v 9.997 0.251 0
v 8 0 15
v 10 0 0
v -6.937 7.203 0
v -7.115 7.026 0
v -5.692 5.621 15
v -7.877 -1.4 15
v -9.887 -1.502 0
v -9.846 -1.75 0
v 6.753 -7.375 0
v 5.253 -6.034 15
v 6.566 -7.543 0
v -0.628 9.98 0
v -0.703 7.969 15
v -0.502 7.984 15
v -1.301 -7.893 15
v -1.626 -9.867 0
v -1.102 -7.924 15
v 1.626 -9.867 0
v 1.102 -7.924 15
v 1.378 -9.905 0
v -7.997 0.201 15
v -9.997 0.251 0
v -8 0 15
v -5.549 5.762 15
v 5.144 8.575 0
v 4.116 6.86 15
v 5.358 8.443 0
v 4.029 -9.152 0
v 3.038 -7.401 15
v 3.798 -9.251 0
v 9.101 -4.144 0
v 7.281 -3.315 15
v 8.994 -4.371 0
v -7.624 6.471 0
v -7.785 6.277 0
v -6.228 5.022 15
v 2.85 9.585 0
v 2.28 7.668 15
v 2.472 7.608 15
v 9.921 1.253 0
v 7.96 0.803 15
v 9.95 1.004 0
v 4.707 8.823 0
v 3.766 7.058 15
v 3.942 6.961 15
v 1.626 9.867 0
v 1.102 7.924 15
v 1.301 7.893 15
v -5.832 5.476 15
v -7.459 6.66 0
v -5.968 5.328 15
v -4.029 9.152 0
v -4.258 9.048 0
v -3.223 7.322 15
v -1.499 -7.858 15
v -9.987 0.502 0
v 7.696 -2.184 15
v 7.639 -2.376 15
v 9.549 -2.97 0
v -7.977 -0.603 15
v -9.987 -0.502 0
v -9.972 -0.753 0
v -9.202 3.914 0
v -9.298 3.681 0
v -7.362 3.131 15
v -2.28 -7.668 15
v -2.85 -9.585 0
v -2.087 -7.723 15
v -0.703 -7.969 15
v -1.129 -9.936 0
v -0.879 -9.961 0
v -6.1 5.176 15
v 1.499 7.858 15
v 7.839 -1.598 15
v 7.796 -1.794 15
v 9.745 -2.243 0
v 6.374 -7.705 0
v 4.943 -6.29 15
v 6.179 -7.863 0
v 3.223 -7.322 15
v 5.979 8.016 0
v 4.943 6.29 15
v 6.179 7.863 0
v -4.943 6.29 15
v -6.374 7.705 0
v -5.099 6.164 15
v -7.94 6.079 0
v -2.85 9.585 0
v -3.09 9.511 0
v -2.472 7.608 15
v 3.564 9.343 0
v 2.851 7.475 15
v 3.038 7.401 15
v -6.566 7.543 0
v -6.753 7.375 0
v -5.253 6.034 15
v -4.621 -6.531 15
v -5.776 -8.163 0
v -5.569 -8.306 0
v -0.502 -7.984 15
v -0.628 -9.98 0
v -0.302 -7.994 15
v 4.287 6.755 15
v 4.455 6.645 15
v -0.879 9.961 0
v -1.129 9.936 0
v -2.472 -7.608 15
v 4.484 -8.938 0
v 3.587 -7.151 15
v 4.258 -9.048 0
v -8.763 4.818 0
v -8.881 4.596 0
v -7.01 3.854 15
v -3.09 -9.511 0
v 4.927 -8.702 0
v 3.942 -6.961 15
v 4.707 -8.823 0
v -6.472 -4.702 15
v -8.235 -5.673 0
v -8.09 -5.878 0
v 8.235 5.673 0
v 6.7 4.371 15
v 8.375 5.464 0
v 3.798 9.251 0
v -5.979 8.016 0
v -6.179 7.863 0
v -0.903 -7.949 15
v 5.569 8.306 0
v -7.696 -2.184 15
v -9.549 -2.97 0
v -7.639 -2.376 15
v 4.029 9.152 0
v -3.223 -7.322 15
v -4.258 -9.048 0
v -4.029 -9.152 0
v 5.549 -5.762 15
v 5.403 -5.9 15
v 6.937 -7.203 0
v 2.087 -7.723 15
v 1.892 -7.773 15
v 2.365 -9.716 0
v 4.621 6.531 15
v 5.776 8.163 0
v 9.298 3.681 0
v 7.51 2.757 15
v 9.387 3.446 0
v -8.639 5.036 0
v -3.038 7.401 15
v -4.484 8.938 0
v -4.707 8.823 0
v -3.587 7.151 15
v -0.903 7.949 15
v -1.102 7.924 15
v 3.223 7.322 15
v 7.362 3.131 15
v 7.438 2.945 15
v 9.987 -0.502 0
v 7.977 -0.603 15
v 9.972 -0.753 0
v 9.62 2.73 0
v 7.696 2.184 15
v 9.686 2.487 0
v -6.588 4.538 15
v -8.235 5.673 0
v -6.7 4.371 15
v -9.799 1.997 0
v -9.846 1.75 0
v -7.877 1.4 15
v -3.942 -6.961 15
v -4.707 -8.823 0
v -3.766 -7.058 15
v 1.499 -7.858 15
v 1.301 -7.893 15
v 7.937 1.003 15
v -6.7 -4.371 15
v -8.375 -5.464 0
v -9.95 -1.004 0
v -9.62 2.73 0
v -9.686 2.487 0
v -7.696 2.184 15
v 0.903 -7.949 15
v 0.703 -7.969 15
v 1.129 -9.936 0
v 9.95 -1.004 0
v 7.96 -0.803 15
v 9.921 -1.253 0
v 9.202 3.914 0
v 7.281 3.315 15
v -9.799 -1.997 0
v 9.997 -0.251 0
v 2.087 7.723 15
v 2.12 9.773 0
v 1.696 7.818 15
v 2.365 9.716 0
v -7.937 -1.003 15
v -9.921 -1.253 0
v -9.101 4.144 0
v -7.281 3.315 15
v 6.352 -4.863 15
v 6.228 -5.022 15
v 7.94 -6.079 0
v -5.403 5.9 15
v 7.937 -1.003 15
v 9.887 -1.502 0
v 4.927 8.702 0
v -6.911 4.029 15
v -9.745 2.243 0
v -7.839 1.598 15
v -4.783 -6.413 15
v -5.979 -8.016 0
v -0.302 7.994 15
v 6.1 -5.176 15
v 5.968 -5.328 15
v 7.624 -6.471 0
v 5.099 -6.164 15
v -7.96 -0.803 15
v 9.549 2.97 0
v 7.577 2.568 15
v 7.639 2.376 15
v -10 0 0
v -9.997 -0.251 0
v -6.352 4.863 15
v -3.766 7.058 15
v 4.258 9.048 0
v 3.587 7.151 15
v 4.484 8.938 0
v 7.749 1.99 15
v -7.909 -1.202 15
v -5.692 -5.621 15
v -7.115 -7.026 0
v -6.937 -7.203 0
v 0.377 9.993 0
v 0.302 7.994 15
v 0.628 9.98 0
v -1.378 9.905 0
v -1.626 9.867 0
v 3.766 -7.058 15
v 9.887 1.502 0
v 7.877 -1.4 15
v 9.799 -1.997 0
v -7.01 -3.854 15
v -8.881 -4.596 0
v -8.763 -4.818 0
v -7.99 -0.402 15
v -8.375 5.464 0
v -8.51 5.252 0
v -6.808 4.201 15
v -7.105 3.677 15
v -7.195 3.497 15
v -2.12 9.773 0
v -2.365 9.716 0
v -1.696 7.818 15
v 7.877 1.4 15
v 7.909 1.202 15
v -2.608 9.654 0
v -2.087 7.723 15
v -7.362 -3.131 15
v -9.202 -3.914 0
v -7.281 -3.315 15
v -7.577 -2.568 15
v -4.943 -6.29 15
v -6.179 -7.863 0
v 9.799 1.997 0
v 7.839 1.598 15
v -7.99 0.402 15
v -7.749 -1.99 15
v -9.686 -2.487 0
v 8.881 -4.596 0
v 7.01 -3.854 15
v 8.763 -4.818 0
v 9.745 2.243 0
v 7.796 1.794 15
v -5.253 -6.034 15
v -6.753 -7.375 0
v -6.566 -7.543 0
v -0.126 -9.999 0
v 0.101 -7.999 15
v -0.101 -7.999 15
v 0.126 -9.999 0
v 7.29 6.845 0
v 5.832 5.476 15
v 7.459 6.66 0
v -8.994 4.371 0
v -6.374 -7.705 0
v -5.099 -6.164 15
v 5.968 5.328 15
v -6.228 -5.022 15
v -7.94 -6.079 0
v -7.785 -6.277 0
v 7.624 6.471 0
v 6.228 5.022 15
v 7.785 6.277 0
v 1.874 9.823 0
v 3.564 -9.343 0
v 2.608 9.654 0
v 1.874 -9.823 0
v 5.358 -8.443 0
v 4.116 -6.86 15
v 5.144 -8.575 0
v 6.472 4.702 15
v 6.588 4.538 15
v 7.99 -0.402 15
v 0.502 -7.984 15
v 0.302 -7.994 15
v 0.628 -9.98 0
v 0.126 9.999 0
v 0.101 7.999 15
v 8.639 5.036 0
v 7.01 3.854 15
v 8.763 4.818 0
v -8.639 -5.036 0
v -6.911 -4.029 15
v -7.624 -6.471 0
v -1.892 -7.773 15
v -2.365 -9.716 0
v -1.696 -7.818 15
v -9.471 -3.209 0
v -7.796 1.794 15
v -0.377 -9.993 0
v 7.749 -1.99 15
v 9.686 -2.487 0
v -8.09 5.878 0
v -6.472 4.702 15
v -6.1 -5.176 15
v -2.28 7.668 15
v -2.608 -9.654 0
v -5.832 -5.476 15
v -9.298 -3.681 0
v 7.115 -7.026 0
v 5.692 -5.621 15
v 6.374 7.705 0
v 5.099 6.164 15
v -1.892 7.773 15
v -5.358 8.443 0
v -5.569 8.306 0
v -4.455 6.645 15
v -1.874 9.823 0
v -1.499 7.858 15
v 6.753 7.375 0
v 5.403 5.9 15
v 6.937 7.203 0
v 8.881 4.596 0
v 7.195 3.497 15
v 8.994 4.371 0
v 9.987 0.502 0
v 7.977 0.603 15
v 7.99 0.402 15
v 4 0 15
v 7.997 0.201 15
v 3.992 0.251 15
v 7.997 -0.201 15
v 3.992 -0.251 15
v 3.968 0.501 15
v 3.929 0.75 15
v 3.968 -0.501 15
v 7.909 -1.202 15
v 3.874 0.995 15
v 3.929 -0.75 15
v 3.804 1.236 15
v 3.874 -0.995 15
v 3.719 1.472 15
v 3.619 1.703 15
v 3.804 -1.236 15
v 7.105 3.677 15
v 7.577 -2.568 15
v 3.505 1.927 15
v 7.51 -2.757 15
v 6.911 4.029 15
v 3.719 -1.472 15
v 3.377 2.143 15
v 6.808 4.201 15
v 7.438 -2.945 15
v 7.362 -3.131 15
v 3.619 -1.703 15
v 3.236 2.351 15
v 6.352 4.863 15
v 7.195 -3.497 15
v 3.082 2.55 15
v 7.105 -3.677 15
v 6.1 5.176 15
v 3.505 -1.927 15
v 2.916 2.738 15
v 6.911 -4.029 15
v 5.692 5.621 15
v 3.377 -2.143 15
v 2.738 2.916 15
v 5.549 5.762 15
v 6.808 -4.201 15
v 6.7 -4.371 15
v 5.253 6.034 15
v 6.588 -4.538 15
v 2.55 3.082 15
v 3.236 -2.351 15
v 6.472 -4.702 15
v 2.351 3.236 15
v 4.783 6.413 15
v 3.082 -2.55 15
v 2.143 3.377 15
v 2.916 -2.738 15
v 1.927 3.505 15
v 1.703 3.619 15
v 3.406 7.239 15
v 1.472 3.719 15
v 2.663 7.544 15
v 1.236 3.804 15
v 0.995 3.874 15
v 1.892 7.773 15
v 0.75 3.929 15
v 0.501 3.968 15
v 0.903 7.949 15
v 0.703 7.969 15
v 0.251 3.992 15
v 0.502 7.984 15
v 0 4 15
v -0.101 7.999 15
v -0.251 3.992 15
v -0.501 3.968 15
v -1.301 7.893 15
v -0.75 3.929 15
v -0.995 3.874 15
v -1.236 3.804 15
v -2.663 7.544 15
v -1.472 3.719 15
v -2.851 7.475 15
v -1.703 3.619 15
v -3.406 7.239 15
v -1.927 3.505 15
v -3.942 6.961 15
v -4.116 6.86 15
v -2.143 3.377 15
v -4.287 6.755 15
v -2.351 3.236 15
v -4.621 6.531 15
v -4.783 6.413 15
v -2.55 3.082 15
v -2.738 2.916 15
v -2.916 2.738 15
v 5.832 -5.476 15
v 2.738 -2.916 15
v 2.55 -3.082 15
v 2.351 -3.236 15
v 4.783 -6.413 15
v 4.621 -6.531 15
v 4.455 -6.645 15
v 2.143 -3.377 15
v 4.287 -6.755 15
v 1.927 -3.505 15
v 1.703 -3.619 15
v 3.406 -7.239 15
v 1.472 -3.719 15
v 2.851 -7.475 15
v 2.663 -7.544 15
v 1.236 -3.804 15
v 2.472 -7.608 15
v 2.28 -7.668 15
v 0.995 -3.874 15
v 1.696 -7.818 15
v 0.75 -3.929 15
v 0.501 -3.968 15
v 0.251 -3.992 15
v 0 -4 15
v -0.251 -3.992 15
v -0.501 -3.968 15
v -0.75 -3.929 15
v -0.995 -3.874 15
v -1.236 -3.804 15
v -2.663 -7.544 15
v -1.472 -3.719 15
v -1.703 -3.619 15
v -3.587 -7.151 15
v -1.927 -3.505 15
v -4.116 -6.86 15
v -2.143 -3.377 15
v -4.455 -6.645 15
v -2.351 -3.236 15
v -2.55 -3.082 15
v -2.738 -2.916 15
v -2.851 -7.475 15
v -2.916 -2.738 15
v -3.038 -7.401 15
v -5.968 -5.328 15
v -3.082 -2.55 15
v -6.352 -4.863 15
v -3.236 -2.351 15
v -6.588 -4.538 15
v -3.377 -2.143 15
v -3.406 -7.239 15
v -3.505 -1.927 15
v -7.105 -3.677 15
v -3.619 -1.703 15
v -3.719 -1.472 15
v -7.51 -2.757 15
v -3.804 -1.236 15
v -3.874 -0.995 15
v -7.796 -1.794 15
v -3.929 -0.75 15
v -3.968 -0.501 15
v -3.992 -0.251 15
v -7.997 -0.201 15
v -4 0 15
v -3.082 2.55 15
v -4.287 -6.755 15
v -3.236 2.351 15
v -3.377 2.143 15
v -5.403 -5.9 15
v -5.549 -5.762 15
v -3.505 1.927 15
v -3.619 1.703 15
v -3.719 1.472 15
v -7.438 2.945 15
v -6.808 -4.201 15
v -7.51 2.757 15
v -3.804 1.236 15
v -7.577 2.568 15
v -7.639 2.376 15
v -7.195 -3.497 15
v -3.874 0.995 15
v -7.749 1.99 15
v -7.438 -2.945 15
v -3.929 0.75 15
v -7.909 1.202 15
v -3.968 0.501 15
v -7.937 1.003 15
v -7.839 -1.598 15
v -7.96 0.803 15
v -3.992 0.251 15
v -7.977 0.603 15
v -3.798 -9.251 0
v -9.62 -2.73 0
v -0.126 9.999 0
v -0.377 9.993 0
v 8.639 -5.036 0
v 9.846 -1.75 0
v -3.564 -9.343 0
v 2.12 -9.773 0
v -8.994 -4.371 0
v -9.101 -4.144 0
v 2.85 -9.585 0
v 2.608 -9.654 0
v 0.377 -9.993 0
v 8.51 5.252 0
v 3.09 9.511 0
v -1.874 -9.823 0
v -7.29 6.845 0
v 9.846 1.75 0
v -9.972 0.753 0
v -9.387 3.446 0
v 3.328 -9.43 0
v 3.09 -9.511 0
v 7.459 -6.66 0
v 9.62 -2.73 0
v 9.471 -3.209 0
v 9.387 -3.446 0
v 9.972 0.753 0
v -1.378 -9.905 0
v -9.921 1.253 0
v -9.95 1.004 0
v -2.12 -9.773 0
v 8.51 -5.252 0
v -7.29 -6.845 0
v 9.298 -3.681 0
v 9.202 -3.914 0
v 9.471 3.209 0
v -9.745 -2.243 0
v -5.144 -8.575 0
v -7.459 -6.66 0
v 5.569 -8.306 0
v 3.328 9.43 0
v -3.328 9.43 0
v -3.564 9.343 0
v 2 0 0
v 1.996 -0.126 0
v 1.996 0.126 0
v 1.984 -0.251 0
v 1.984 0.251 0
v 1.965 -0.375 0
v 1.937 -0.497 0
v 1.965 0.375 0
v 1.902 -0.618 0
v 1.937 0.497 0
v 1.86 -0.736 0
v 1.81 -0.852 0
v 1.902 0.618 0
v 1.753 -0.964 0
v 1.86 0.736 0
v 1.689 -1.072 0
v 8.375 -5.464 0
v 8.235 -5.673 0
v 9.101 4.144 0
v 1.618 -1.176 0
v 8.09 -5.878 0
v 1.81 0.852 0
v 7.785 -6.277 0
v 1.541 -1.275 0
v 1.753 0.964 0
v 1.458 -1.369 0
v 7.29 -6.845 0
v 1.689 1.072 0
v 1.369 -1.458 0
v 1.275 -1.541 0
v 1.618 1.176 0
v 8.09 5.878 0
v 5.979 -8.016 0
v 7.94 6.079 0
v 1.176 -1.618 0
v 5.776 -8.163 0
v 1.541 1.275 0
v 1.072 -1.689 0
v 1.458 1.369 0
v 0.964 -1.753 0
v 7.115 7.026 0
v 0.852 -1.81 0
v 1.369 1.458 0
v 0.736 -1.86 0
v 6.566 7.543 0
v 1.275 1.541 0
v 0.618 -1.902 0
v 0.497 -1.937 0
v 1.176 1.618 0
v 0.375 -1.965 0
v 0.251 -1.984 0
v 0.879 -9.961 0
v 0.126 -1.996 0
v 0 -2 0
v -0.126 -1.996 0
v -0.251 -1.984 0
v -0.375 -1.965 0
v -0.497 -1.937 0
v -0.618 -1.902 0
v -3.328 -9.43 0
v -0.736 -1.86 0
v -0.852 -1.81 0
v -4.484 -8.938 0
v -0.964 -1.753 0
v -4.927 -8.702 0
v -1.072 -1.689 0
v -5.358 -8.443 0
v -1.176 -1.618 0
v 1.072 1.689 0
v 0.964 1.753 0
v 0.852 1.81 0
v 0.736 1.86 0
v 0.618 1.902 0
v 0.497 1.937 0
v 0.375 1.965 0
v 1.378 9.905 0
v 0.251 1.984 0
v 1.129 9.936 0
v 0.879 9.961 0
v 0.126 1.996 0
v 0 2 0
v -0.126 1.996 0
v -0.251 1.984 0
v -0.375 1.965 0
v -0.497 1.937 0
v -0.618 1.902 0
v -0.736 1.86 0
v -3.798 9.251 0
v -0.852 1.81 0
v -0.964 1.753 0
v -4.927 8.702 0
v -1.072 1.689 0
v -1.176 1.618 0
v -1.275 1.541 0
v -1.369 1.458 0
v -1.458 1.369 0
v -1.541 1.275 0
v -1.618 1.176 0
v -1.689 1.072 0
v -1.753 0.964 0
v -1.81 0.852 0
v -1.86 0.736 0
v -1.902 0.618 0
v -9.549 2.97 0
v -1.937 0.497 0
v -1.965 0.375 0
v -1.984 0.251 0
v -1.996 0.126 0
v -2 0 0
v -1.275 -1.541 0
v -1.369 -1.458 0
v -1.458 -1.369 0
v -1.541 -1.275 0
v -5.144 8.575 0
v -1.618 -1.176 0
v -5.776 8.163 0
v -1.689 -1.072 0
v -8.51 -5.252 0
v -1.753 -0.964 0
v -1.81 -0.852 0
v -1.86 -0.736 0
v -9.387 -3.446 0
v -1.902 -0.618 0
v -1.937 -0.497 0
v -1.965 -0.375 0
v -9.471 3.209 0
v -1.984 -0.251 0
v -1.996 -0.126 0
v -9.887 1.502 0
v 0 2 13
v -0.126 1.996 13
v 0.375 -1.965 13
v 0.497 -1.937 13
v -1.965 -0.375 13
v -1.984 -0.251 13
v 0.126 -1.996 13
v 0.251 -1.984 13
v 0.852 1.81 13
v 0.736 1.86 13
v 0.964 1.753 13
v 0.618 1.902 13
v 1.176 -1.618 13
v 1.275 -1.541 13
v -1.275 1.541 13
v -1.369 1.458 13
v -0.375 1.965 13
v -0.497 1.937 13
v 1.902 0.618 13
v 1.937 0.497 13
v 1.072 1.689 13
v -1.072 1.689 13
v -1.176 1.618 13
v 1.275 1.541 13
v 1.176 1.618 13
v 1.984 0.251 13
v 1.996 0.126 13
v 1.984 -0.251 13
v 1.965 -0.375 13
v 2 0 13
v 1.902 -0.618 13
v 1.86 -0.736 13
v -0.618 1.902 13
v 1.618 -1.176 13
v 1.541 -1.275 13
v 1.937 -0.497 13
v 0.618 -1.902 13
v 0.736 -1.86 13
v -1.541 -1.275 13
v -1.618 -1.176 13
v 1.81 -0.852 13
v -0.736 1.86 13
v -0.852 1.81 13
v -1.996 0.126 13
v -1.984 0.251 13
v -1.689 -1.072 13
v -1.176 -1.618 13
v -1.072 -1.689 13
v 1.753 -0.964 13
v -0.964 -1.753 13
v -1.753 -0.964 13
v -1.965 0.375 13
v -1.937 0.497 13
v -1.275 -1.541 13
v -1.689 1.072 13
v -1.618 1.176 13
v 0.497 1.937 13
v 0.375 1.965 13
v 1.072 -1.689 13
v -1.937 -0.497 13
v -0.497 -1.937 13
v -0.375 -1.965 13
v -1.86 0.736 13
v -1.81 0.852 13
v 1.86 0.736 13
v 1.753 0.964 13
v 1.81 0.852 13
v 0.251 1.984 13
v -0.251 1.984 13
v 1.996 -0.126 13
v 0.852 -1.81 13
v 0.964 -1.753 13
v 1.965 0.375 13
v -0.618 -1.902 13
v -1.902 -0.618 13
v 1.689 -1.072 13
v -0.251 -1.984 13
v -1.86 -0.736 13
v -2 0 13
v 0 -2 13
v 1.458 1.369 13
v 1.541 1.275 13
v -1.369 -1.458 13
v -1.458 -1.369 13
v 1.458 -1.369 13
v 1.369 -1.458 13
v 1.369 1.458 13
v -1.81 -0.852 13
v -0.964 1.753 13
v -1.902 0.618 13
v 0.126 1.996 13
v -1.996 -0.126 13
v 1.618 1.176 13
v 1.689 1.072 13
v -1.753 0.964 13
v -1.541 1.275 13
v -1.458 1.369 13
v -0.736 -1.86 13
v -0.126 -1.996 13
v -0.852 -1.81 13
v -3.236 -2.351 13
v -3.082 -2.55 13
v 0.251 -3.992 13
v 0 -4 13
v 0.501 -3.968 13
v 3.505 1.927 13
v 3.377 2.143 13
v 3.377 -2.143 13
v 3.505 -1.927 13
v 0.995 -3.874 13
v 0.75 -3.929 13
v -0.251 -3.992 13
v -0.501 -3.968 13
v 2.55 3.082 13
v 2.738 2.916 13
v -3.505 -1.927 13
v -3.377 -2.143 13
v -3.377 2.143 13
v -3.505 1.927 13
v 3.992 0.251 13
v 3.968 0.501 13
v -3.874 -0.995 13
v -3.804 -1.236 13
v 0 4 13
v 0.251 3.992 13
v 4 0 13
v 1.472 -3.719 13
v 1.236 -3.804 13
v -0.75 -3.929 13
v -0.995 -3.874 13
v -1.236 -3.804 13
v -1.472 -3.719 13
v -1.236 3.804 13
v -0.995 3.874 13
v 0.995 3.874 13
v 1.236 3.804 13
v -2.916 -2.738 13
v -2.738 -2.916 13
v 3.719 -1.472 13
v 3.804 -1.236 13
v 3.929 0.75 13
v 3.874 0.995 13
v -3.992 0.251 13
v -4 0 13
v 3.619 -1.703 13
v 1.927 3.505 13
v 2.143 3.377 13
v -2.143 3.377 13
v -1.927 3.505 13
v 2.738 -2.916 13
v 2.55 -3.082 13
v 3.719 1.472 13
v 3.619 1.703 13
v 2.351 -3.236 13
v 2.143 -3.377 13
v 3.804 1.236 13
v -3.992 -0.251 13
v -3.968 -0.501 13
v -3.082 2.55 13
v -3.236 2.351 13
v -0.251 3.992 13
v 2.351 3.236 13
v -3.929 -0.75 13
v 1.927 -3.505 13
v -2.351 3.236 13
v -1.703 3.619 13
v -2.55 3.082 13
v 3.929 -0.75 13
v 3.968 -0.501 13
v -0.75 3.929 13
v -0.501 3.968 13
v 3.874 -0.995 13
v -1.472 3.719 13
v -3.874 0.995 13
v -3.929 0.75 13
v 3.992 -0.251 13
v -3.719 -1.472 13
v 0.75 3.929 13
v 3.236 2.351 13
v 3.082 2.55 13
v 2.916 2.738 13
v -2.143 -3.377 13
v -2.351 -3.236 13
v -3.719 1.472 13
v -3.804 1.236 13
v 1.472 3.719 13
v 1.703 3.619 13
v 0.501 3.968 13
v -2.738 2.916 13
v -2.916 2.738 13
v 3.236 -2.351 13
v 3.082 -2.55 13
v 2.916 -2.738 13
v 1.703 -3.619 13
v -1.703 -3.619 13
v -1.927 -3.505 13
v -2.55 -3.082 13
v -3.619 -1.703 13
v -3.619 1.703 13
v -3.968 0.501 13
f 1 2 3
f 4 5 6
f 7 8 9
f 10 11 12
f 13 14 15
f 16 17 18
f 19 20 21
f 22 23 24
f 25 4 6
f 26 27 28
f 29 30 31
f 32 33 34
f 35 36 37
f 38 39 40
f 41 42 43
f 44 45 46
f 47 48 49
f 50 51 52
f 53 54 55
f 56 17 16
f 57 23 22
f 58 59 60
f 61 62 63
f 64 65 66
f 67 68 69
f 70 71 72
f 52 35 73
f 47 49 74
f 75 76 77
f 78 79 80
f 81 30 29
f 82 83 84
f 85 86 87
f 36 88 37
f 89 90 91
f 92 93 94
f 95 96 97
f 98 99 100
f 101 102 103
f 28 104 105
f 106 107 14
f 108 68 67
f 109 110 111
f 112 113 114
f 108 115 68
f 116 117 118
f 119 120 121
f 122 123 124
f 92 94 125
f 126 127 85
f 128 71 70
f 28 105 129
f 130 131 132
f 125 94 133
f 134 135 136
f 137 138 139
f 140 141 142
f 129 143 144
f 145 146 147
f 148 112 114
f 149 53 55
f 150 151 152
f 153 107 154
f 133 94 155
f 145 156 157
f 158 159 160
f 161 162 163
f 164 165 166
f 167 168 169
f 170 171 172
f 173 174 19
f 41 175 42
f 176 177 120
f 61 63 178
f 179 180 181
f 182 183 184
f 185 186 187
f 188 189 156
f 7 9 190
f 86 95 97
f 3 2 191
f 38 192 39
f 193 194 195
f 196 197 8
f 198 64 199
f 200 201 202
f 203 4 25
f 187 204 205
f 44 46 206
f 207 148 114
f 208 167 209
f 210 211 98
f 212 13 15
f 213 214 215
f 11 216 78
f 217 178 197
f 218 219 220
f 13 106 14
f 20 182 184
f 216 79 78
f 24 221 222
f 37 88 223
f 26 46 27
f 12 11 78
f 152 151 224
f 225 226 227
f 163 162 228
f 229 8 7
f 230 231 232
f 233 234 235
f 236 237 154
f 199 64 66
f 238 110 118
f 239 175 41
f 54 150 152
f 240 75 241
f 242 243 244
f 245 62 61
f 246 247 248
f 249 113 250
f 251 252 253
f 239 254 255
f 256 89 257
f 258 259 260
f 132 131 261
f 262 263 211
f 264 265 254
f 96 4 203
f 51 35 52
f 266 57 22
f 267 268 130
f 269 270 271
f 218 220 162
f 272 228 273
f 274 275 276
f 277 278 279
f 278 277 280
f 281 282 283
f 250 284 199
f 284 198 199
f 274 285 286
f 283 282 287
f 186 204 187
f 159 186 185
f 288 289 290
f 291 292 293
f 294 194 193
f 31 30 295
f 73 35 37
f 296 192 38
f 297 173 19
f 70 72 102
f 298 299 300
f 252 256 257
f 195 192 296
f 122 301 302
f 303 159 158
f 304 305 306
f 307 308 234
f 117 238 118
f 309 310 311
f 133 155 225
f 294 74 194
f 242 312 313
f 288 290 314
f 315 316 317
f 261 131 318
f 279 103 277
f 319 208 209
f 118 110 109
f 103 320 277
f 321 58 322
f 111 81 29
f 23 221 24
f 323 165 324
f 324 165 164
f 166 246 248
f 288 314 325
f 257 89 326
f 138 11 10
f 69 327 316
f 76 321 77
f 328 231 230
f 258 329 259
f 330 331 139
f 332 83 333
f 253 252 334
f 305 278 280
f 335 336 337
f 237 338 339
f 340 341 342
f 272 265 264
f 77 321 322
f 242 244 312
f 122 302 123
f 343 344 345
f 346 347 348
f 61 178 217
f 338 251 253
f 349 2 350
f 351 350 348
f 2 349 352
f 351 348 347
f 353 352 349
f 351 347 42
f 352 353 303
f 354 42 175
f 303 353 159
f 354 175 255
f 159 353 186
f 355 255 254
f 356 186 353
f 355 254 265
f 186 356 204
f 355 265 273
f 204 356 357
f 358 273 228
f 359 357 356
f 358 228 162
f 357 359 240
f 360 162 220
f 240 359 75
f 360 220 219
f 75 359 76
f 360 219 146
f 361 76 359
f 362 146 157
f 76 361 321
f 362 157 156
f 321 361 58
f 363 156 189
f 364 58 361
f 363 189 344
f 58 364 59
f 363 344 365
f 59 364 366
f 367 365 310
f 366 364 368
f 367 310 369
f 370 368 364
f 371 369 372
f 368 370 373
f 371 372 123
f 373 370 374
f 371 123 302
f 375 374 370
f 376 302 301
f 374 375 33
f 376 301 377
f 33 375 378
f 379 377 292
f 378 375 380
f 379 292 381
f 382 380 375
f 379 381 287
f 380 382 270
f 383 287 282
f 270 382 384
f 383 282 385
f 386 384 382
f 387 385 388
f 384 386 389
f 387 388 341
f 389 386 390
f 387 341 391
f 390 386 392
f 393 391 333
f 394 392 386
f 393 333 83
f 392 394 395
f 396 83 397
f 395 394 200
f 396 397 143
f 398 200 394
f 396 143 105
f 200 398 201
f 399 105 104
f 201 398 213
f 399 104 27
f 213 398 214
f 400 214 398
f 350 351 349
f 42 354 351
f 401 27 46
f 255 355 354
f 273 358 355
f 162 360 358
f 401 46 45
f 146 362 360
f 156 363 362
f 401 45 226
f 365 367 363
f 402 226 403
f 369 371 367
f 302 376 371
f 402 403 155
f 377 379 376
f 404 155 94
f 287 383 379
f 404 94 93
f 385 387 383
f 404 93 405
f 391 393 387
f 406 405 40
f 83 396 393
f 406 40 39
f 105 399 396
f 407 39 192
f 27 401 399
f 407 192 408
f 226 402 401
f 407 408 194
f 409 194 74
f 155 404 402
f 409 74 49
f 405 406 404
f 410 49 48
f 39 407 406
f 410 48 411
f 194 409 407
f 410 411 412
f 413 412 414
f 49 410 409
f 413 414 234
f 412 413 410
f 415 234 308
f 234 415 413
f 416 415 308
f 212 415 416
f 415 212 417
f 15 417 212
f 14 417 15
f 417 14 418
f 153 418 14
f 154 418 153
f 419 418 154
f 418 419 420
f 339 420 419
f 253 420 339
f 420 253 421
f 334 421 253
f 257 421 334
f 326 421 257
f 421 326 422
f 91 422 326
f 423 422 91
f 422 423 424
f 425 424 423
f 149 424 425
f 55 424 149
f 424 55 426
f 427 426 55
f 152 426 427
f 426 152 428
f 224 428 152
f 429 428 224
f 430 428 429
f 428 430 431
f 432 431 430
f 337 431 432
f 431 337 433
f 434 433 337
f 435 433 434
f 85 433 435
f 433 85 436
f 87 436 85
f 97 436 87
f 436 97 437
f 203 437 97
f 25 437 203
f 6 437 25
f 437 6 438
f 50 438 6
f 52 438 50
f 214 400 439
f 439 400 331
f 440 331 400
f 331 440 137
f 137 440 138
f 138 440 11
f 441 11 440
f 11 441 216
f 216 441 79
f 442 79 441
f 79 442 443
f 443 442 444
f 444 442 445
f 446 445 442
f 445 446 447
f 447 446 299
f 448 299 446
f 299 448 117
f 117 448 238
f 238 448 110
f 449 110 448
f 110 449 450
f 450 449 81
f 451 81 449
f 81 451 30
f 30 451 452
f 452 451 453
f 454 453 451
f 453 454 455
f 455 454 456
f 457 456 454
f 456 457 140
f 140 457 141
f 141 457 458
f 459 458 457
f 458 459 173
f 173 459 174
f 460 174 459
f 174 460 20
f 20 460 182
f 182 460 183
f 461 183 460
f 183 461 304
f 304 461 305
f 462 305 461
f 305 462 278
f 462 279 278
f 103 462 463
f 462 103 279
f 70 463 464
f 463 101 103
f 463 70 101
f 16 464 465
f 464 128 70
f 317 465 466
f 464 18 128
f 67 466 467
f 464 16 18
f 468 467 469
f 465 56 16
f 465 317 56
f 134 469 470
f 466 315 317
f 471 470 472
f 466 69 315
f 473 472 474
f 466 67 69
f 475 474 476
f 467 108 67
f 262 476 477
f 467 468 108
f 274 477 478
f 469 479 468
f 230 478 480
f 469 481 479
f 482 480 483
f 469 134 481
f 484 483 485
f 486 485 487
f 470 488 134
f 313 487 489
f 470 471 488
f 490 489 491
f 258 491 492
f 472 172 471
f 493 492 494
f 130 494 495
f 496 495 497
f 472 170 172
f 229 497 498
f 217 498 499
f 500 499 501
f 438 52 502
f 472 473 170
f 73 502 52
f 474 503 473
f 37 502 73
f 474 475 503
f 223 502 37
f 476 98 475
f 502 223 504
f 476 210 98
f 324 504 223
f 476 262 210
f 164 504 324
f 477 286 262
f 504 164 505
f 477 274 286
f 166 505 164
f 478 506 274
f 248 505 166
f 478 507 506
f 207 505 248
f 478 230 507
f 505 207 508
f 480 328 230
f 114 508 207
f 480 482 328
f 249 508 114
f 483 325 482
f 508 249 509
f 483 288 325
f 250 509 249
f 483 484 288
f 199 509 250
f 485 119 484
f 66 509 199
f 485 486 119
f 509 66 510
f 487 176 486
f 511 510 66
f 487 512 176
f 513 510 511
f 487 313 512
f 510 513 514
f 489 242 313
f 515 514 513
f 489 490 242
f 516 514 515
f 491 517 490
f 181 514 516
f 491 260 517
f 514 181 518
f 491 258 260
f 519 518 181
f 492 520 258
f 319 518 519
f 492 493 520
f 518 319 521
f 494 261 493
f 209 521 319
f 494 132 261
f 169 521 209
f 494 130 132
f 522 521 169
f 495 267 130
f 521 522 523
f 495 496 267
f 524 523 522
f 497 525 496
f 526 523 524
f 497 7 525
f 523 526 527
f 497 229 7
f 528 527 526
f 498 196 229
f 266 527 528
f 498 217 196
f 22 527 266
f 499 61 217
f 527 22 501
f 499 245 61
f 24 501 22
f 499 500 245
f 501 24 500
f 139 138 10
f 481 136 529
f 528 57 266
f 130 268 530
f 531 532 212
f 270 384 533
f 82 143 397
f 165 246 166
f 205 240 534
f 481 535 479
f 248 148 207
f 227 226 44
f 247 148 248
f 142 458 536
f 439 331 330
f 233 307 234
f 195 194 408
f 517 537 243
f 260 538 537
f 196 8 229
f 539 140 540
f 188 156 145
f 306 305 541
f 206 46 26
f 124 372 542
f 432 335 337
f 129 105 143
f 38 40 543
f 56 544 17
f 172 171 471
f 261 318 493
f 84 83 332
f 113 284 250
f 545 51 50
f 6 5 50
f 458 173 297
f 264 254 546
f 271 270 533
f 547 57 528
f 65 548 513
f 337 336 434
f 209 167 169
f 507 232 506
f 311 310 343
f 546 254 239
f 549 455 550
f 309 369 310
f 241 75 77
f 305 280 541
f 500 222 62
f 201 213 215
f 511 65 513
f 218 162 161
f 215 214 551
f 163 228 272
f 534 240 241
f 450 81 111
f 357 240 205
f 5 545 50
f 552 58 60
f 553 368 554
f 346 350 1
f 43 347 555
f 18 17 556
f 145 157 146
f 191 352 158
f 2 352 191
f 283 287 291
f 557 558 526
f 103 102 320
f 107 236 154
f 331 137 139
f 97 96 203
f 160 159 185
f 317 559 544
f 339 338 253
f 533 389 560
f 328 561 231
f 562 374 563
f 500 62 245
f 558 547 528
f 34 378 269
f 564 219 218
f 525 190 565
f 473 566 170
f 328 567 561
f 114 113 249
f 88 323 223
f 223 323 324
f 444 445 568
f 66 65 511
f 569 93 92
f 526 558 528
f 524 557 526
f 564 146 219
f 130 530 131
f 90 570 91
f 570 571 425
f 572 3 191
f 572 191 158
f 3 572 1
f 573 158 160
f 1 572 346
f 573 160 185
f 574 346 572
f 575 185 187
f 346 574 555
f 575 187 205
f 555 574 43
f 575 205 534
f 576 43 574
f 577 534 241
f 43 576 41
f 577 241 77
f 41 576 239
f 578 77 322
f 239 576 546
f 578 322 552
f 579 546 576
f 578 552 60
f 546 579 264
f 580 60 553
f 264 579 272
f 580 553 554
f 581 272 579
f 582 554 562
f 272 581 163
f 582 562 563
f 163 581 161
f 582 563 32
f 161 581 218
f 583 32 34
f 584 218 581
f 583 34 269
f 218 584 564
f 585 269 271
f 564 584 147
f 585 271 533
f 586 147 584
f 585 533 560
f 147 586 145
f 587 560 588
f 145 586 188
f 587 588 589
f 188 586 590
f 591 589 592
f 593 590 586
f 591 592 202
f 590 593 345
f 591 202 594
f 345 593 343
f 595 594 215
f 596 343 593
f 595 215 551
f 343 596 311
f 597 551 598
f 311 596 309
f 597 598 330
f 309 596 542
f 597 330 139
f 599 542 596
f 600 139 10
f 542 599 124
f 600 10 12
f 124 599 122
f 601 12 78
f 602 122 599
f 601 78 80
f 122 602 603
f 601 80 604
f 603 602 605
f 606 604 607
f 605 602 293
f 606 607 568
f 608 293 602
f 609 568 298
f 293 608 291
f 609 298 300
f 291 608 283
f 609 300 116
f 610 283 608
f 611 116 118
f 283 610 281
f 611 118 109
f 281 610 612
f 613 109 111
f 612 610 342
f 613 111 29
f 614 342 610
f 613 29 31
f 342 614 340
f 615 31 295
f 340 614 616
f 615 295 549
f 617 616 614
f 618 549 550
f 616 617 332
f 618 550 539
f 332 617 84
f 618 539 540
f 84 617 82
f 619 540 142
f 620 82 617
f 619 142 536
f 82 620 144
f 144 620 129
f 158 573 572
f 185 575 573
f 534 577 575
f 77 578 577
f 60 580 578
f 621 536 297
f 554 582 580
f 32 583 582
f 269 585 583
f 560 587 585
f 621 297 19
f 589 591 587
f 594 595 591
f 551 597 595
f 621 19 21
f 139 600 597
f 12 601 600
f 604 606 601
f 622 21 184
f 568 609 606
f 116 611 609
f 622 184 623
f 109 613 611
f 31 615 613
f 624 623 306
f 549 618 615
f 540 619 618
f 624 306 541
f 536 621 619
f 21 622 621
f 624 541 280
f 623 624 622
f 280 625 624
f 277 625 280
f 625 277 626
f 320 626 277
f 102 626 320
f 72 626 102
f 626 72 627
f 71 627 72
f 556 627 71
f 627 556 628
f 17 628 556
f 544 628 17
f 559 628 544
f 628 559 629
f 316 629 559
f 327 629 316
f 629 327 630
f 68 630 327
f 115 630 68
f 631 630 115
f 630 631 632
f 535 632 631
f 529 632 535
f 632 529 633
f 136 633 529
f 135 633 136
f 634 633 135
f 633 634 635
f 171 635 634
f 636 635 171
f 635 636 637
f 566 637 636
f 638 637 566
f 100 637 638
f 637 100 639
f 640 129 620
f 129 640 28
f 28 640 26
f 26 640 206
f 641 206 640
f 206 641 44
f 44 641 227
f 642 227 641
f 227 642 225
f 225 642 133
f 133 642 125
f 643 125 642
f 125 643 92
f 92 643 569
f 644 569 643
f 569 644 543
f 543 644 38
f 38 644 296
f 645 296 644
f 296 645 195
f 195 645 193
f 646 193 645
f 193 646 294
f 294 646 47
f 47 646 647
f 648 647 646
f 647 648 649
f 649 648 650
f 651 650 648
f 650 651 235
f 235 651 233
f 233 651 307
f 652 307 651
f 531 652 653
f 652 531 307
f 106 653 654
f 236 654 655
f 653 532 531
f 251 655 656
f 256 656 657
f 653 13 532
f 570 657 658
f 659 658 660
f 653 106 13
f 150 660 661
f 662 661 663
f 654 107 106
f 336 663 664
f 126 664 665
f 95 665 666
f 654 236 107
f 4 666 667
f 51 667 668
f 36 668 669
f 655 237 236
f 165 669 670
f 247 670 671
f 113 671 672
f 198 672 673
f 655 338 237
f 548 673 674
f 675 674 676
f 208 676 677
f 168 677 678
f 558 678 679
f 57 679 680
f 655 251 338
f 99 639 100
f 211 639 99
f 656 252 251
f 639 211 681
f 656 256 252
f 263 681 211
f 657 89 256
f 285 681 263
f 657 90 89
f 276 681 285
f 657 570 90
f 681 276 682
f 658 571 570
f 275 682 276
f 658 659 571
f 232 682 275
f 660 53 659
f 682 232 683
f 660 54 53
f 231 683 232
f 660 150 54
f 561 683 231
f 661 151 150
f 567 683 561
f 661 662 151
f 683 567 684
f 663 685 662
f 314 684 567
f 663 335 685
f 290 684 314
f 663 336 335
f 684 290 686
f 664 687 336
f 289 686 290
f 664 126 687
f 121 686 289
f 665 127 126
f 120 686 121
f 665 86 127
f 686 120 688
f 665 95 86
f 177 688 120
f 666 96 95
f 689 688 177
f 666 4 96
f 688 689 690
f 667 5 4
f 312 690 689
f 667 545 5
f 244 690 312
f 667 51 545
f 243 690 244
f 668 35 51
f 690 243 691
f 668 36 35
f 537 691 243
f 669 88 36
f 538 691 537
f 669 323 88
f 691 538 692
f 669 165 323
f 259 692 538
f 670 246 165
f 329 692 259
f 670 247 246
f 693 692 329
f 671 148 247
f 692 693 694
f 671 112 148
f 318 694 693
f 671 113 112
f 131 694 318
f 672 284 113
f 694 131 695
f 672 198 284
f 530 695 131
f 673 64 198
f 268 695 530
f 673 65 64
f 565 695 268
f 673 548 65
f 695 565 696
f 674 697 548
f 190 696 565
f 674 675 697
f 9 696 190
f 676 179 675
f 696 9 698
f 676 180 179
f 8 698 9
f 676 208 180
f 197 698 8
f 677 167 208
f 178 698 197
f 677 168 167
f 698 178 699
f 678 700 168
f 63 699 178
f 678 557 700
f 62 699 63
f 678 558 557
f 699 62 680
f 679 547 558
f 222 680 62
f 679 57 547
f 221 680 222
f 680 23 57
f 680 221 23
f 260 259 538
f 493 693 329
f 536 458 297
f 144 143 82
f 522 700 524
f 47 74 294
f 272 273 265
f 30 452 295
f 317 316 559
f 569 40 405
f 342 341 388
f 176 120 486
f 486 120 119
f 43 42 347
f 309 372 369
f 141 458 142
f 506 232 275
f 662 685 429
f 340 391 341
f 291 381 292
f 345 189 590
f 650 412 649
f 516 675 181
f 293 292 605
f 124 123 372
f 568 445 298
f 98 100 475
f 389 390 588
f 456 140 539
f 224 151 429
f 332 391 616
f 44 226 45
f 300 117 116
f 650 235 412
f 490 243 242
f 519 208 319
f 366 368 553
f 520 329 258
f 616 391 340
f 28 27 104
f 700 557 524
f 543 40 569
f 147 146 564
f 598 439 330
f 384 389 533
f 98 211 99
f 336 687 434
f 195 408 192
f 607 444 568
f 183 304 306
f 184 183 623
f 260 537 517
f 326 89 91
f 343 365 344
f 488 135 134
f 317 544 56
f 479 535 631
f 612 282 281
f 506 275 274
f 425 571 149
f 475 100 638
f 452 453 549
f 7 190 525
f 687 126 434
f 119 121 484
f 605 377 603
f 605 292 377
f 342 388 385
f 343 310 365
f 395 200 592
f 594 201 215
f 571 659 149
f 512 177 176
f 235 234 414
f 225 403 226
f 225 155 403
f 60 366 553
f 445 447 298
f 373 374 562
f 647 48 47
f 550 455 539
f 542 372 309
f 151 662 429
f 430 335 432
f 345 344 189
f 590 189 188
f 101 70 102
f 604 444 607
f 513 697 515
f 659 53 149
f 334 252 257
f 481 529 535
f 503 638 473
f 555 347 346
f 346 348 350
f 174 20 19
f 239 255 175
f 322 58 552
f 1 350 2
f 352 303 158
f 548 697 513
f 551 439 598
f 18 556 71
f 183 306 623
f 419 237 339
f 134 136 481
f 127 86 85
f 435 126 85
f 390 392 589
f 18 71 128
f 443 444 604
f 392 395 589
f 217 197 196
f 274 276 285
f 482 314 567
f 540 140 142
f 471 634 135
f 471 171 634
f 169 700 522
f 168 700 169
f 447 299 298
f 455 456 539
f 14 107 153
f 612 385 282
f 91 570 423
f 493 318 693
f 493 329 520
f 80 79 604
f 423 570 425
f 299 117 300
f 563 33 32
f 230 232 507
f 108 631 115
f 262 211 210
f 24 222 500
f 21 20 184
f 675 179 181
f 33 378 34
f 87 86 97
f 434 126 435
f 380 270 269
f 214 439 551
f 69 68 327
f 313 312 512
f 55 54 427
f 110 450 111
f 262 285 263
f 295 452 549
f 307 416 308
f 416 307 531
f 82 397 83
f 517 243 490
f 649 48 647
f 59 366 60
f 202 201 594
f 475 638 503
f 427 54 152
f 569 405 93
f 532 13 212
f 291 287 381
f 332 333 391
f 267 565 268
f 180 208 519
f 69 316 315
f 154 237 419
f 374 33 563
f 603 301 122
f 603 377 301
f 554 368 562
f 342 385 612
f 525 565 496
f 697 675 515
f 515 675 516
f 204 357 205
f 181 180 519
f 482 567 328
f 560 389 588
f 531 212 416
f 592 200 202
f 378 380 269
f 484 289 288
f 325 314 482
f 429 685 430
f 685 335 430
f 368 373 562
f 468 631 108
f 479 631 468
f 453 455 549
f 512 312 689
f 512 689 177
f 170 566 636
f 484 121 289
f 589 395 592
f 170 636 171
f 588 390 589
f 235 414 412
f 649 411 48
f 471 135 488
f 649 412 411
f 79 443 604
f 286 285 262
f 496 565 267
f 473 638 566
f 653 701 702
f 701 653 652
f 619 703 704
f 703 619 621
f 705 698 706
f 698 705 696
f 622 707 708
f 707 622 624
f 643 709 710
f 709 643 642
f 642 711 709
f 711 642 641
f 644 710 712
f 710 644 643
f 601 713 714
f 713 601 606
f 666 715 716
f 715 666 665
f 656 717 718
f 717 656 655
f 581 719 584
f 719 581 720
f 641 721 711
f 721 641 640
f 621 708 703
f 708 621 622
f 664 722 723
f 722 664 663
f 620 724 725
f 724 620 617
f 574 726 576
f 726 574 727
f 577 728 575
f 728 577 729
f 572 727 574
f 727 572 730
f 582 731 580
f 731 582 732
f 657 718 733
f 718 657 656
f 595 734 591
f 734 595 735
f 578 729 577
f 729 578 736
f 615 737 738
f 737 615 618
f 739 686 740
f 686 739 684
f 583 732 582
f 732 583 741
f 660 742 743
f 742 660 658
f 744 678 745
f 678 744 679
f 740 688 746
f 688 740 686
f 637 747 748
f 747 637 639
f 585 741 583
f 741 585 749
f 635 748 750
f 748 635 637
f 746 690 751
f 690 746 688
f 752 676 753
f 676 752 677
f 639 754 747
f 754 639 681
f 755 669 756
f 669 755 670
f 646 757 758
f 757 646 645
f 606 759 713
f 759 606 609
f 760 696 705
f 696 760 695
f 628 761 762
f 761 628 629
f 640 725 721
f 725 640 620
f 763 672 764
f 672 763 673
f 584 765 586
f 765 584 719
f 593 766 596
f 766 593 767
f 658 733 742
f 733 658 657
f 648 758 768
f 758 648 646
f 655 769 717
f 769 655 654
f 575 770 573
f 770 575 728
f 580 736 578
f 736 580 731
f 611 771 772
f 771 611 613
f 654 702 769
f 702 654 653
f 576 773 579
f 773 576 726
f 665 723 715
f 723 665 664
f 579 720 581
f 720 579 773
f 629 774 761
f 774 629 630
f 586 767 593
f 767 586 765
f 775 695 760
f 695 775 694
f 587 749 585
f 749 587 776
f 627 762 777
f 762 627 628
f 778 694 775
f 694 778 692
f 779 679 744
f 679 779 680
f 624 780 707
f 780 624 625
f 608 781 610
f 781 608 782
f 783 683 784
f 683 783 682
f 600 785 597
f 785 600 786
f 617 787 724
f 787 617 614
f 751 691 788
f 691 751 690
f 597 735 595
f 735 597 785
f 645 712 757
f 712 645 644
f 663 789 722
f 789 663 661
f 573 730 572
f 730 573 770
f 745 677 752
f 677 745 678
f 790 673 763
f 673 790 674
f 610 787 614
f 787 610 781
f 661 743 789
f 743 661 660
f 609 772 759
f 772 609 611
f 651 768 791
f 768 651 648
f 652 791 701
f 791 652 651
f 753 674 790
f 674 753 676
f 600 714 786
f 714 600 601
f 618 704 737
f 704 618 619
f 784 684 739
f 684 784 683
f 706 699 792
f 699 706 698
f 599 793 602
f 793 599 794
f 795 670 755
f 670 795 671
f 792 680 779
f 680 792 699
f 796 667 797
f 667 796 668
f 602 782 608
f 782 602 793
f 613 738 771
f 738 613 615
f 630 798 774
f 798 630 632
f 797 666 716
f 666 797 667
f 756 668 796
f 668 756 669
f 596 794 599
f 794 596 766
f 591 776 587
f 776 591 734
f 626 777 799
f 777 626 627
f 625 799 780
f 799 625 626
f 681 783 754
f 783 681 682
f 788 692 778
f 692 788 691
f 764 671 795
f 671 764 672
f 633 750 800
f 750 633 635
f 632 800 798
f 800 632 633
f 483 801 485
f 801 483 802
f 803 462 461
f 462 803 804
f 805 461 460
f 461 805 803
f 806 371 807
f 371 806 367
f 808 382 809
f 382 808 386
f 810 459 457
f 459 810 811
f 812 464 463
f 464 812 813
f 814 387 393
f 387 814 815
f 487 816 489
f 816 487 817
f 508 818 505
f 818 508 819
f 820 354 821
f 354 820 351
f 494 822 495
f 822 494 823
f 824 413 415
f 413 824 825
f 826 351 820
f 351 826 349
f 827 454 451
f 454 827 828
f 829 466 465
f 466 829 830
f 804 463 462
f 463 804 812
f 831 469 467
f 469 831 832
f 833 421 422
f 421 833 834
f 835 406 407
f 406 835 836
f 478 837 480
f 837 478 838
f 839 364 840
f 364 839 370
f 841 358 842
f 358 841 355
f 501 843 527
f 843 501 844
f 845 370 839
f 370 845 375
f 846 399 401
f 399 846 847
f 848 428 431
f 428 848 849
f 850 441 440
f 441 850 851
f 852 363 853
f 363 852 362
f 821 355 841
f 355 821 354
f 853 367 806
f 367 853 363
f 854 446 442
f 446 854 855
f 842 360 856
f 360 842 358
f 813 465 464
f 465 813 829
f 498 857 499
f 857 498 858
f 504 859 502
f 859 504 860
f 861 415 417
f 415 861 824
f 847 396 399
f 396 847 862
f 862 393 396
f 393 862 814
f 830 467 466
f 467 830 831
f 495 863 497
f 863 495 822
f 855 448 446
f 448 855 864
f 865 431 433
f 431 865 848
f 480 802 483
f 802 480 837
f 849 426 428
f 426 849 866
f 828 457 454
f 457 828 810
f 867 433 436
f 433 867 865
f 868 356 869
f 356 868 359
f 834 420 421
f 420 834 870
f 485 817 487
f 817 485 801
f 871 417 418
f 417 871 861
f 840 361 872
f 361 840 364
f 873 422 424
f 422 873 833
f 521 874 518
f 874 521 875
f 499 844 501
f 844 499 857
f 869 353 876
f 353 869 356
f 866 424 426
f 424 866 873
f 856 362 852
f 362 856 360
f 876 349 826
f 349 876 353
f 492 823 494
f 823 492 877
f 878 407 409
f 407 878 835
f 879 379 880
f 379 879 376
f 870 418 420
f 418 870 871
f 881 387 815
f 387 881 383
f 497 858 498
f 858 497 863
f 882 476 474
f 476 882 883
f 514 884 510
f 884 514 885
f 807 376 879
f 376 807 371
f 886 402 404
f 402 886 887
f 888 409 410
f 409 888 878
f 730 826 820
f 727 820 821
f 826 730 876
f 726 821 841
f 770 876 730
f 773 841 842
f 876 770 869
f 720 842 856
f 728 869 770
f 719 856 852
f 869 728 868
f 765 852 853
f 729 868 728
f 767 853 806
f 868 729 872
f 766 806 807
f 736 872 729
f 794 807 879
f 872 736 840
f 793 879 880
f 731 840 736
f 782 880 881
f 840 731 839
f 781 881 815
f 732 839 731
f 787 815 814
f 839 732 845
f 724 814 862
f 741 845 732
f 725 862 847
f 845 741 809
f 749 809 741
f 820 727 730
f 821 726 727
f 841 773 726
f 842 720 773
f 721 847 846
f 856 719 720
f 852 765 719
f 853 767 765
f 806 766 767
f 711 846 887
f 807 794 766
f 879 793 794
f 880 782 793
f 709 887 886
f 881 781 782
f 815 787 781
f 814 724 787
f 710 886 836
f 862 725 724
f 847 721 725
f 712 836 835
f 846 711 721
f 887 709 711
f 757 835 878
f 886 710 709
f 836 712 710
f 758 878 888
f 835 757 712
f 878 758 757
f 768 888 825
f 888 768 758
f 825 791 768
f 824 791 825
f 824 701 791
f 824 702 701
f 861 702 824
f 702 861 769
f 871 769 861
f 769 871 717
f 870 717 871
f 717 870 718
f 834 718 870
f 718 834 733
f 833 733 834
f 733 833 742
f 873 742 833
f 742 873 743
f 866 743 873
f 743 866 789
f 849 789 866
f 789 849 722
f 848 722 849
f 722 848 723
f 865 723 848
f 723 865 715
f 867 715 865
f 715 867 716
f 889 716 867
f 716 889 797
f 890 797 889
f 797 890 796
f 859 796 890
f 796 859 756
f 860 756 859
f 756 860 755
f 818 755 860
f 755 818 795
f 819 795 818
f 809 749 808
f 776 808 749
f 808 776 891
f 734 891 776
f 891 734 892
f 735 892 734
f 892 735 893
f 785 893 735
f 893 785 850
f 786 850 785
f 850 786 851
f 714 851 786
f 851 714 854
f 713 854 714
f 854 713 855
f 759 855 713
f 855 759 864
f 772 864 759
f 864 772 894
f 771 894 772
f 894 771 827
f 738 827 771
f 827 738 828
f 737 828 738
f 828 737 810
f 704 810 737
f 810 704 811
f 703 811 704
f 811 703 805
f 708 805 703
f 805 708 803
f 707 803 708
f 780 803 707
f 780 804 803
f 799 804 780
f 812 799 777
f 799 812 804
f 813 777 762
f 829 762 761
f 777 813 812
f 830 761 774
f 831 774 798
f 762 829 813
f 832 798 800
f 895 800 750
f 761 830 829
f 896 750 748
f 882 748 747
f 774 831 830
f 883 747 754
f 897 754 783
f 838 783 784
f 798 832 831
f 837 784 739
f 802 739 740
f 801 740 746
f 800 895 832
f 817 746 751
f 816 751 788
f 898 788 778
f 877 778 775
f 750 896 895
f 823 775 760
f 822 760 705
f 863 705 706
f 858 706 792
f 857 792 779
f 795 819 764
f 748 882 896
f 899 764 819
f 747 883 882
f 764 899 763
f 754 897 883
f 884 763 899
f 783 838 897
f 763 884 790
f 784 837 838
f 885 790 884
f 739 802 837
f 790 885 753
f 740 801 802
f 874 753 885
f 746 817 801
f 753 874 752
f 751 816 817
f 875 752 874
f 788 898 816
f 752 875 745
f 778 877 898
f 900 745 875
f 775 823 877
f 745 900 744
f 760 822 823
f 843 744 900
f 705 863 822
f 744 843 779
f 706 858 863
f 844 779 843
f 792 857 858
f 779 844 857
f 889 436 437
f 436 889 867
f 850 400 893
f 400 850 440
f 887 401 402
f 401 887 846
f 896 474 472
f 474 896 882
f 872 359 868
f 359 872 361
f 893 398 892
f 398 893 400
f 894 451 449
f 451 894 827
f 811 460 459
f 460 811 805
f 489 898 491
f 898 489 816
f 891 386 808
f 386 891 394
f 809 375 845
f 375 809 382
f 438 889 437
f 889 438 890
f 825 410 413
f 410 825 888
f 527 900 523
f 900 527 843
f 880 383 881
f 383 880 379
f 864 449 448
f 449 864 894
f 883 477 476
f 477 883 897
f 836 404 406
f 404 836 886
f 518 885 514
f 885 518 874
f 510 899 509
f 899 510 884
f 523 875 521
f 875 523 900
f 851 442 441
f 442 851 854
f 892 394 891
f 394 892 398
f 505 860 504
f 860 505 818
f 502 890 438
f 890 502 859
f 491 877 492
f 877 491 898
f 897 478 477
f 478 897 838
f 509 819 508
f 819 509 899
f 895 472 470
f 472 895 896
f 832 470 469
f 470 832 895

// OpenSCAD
// [FL_INDEX: keywords="openscad, 3d_parametric, Furniture_Foot, csg_solid" | COT="Parametric OpenSCAD design from 3DCodeverse"]
// Title: Furniture Foot

//Heigth of the Foot
FootHeigth = 15; //[5:50]

//Top foot size
TopWith = 10; //[5:30]

//Bottom foot size
BottomWith = 8; //[5:30]

//Hole diameter
HoleDiameter = 2; //[0.5:5]

//Size of the screw / nail
HeadHigth = 2; //[1:10]

//Size of the screw / nail Head
HeadWith = 4; //[2:10]


module FurnitureFoot()
{
	difference()
	{
		cylinder(r1=TopWith, r2=BottomWith, h=FootHeigth, $fn=250);
		translate([0,0,-1])cylinder(r=HoleDiameter, h=(FootHeigth+2),$fn=100);
		translate([0,0,FootHeigth-HeadHigth])cylinder(r=HeadWith, h=HeadHigth+1,$fn=100);
	}
}

FurnitureFoot();
